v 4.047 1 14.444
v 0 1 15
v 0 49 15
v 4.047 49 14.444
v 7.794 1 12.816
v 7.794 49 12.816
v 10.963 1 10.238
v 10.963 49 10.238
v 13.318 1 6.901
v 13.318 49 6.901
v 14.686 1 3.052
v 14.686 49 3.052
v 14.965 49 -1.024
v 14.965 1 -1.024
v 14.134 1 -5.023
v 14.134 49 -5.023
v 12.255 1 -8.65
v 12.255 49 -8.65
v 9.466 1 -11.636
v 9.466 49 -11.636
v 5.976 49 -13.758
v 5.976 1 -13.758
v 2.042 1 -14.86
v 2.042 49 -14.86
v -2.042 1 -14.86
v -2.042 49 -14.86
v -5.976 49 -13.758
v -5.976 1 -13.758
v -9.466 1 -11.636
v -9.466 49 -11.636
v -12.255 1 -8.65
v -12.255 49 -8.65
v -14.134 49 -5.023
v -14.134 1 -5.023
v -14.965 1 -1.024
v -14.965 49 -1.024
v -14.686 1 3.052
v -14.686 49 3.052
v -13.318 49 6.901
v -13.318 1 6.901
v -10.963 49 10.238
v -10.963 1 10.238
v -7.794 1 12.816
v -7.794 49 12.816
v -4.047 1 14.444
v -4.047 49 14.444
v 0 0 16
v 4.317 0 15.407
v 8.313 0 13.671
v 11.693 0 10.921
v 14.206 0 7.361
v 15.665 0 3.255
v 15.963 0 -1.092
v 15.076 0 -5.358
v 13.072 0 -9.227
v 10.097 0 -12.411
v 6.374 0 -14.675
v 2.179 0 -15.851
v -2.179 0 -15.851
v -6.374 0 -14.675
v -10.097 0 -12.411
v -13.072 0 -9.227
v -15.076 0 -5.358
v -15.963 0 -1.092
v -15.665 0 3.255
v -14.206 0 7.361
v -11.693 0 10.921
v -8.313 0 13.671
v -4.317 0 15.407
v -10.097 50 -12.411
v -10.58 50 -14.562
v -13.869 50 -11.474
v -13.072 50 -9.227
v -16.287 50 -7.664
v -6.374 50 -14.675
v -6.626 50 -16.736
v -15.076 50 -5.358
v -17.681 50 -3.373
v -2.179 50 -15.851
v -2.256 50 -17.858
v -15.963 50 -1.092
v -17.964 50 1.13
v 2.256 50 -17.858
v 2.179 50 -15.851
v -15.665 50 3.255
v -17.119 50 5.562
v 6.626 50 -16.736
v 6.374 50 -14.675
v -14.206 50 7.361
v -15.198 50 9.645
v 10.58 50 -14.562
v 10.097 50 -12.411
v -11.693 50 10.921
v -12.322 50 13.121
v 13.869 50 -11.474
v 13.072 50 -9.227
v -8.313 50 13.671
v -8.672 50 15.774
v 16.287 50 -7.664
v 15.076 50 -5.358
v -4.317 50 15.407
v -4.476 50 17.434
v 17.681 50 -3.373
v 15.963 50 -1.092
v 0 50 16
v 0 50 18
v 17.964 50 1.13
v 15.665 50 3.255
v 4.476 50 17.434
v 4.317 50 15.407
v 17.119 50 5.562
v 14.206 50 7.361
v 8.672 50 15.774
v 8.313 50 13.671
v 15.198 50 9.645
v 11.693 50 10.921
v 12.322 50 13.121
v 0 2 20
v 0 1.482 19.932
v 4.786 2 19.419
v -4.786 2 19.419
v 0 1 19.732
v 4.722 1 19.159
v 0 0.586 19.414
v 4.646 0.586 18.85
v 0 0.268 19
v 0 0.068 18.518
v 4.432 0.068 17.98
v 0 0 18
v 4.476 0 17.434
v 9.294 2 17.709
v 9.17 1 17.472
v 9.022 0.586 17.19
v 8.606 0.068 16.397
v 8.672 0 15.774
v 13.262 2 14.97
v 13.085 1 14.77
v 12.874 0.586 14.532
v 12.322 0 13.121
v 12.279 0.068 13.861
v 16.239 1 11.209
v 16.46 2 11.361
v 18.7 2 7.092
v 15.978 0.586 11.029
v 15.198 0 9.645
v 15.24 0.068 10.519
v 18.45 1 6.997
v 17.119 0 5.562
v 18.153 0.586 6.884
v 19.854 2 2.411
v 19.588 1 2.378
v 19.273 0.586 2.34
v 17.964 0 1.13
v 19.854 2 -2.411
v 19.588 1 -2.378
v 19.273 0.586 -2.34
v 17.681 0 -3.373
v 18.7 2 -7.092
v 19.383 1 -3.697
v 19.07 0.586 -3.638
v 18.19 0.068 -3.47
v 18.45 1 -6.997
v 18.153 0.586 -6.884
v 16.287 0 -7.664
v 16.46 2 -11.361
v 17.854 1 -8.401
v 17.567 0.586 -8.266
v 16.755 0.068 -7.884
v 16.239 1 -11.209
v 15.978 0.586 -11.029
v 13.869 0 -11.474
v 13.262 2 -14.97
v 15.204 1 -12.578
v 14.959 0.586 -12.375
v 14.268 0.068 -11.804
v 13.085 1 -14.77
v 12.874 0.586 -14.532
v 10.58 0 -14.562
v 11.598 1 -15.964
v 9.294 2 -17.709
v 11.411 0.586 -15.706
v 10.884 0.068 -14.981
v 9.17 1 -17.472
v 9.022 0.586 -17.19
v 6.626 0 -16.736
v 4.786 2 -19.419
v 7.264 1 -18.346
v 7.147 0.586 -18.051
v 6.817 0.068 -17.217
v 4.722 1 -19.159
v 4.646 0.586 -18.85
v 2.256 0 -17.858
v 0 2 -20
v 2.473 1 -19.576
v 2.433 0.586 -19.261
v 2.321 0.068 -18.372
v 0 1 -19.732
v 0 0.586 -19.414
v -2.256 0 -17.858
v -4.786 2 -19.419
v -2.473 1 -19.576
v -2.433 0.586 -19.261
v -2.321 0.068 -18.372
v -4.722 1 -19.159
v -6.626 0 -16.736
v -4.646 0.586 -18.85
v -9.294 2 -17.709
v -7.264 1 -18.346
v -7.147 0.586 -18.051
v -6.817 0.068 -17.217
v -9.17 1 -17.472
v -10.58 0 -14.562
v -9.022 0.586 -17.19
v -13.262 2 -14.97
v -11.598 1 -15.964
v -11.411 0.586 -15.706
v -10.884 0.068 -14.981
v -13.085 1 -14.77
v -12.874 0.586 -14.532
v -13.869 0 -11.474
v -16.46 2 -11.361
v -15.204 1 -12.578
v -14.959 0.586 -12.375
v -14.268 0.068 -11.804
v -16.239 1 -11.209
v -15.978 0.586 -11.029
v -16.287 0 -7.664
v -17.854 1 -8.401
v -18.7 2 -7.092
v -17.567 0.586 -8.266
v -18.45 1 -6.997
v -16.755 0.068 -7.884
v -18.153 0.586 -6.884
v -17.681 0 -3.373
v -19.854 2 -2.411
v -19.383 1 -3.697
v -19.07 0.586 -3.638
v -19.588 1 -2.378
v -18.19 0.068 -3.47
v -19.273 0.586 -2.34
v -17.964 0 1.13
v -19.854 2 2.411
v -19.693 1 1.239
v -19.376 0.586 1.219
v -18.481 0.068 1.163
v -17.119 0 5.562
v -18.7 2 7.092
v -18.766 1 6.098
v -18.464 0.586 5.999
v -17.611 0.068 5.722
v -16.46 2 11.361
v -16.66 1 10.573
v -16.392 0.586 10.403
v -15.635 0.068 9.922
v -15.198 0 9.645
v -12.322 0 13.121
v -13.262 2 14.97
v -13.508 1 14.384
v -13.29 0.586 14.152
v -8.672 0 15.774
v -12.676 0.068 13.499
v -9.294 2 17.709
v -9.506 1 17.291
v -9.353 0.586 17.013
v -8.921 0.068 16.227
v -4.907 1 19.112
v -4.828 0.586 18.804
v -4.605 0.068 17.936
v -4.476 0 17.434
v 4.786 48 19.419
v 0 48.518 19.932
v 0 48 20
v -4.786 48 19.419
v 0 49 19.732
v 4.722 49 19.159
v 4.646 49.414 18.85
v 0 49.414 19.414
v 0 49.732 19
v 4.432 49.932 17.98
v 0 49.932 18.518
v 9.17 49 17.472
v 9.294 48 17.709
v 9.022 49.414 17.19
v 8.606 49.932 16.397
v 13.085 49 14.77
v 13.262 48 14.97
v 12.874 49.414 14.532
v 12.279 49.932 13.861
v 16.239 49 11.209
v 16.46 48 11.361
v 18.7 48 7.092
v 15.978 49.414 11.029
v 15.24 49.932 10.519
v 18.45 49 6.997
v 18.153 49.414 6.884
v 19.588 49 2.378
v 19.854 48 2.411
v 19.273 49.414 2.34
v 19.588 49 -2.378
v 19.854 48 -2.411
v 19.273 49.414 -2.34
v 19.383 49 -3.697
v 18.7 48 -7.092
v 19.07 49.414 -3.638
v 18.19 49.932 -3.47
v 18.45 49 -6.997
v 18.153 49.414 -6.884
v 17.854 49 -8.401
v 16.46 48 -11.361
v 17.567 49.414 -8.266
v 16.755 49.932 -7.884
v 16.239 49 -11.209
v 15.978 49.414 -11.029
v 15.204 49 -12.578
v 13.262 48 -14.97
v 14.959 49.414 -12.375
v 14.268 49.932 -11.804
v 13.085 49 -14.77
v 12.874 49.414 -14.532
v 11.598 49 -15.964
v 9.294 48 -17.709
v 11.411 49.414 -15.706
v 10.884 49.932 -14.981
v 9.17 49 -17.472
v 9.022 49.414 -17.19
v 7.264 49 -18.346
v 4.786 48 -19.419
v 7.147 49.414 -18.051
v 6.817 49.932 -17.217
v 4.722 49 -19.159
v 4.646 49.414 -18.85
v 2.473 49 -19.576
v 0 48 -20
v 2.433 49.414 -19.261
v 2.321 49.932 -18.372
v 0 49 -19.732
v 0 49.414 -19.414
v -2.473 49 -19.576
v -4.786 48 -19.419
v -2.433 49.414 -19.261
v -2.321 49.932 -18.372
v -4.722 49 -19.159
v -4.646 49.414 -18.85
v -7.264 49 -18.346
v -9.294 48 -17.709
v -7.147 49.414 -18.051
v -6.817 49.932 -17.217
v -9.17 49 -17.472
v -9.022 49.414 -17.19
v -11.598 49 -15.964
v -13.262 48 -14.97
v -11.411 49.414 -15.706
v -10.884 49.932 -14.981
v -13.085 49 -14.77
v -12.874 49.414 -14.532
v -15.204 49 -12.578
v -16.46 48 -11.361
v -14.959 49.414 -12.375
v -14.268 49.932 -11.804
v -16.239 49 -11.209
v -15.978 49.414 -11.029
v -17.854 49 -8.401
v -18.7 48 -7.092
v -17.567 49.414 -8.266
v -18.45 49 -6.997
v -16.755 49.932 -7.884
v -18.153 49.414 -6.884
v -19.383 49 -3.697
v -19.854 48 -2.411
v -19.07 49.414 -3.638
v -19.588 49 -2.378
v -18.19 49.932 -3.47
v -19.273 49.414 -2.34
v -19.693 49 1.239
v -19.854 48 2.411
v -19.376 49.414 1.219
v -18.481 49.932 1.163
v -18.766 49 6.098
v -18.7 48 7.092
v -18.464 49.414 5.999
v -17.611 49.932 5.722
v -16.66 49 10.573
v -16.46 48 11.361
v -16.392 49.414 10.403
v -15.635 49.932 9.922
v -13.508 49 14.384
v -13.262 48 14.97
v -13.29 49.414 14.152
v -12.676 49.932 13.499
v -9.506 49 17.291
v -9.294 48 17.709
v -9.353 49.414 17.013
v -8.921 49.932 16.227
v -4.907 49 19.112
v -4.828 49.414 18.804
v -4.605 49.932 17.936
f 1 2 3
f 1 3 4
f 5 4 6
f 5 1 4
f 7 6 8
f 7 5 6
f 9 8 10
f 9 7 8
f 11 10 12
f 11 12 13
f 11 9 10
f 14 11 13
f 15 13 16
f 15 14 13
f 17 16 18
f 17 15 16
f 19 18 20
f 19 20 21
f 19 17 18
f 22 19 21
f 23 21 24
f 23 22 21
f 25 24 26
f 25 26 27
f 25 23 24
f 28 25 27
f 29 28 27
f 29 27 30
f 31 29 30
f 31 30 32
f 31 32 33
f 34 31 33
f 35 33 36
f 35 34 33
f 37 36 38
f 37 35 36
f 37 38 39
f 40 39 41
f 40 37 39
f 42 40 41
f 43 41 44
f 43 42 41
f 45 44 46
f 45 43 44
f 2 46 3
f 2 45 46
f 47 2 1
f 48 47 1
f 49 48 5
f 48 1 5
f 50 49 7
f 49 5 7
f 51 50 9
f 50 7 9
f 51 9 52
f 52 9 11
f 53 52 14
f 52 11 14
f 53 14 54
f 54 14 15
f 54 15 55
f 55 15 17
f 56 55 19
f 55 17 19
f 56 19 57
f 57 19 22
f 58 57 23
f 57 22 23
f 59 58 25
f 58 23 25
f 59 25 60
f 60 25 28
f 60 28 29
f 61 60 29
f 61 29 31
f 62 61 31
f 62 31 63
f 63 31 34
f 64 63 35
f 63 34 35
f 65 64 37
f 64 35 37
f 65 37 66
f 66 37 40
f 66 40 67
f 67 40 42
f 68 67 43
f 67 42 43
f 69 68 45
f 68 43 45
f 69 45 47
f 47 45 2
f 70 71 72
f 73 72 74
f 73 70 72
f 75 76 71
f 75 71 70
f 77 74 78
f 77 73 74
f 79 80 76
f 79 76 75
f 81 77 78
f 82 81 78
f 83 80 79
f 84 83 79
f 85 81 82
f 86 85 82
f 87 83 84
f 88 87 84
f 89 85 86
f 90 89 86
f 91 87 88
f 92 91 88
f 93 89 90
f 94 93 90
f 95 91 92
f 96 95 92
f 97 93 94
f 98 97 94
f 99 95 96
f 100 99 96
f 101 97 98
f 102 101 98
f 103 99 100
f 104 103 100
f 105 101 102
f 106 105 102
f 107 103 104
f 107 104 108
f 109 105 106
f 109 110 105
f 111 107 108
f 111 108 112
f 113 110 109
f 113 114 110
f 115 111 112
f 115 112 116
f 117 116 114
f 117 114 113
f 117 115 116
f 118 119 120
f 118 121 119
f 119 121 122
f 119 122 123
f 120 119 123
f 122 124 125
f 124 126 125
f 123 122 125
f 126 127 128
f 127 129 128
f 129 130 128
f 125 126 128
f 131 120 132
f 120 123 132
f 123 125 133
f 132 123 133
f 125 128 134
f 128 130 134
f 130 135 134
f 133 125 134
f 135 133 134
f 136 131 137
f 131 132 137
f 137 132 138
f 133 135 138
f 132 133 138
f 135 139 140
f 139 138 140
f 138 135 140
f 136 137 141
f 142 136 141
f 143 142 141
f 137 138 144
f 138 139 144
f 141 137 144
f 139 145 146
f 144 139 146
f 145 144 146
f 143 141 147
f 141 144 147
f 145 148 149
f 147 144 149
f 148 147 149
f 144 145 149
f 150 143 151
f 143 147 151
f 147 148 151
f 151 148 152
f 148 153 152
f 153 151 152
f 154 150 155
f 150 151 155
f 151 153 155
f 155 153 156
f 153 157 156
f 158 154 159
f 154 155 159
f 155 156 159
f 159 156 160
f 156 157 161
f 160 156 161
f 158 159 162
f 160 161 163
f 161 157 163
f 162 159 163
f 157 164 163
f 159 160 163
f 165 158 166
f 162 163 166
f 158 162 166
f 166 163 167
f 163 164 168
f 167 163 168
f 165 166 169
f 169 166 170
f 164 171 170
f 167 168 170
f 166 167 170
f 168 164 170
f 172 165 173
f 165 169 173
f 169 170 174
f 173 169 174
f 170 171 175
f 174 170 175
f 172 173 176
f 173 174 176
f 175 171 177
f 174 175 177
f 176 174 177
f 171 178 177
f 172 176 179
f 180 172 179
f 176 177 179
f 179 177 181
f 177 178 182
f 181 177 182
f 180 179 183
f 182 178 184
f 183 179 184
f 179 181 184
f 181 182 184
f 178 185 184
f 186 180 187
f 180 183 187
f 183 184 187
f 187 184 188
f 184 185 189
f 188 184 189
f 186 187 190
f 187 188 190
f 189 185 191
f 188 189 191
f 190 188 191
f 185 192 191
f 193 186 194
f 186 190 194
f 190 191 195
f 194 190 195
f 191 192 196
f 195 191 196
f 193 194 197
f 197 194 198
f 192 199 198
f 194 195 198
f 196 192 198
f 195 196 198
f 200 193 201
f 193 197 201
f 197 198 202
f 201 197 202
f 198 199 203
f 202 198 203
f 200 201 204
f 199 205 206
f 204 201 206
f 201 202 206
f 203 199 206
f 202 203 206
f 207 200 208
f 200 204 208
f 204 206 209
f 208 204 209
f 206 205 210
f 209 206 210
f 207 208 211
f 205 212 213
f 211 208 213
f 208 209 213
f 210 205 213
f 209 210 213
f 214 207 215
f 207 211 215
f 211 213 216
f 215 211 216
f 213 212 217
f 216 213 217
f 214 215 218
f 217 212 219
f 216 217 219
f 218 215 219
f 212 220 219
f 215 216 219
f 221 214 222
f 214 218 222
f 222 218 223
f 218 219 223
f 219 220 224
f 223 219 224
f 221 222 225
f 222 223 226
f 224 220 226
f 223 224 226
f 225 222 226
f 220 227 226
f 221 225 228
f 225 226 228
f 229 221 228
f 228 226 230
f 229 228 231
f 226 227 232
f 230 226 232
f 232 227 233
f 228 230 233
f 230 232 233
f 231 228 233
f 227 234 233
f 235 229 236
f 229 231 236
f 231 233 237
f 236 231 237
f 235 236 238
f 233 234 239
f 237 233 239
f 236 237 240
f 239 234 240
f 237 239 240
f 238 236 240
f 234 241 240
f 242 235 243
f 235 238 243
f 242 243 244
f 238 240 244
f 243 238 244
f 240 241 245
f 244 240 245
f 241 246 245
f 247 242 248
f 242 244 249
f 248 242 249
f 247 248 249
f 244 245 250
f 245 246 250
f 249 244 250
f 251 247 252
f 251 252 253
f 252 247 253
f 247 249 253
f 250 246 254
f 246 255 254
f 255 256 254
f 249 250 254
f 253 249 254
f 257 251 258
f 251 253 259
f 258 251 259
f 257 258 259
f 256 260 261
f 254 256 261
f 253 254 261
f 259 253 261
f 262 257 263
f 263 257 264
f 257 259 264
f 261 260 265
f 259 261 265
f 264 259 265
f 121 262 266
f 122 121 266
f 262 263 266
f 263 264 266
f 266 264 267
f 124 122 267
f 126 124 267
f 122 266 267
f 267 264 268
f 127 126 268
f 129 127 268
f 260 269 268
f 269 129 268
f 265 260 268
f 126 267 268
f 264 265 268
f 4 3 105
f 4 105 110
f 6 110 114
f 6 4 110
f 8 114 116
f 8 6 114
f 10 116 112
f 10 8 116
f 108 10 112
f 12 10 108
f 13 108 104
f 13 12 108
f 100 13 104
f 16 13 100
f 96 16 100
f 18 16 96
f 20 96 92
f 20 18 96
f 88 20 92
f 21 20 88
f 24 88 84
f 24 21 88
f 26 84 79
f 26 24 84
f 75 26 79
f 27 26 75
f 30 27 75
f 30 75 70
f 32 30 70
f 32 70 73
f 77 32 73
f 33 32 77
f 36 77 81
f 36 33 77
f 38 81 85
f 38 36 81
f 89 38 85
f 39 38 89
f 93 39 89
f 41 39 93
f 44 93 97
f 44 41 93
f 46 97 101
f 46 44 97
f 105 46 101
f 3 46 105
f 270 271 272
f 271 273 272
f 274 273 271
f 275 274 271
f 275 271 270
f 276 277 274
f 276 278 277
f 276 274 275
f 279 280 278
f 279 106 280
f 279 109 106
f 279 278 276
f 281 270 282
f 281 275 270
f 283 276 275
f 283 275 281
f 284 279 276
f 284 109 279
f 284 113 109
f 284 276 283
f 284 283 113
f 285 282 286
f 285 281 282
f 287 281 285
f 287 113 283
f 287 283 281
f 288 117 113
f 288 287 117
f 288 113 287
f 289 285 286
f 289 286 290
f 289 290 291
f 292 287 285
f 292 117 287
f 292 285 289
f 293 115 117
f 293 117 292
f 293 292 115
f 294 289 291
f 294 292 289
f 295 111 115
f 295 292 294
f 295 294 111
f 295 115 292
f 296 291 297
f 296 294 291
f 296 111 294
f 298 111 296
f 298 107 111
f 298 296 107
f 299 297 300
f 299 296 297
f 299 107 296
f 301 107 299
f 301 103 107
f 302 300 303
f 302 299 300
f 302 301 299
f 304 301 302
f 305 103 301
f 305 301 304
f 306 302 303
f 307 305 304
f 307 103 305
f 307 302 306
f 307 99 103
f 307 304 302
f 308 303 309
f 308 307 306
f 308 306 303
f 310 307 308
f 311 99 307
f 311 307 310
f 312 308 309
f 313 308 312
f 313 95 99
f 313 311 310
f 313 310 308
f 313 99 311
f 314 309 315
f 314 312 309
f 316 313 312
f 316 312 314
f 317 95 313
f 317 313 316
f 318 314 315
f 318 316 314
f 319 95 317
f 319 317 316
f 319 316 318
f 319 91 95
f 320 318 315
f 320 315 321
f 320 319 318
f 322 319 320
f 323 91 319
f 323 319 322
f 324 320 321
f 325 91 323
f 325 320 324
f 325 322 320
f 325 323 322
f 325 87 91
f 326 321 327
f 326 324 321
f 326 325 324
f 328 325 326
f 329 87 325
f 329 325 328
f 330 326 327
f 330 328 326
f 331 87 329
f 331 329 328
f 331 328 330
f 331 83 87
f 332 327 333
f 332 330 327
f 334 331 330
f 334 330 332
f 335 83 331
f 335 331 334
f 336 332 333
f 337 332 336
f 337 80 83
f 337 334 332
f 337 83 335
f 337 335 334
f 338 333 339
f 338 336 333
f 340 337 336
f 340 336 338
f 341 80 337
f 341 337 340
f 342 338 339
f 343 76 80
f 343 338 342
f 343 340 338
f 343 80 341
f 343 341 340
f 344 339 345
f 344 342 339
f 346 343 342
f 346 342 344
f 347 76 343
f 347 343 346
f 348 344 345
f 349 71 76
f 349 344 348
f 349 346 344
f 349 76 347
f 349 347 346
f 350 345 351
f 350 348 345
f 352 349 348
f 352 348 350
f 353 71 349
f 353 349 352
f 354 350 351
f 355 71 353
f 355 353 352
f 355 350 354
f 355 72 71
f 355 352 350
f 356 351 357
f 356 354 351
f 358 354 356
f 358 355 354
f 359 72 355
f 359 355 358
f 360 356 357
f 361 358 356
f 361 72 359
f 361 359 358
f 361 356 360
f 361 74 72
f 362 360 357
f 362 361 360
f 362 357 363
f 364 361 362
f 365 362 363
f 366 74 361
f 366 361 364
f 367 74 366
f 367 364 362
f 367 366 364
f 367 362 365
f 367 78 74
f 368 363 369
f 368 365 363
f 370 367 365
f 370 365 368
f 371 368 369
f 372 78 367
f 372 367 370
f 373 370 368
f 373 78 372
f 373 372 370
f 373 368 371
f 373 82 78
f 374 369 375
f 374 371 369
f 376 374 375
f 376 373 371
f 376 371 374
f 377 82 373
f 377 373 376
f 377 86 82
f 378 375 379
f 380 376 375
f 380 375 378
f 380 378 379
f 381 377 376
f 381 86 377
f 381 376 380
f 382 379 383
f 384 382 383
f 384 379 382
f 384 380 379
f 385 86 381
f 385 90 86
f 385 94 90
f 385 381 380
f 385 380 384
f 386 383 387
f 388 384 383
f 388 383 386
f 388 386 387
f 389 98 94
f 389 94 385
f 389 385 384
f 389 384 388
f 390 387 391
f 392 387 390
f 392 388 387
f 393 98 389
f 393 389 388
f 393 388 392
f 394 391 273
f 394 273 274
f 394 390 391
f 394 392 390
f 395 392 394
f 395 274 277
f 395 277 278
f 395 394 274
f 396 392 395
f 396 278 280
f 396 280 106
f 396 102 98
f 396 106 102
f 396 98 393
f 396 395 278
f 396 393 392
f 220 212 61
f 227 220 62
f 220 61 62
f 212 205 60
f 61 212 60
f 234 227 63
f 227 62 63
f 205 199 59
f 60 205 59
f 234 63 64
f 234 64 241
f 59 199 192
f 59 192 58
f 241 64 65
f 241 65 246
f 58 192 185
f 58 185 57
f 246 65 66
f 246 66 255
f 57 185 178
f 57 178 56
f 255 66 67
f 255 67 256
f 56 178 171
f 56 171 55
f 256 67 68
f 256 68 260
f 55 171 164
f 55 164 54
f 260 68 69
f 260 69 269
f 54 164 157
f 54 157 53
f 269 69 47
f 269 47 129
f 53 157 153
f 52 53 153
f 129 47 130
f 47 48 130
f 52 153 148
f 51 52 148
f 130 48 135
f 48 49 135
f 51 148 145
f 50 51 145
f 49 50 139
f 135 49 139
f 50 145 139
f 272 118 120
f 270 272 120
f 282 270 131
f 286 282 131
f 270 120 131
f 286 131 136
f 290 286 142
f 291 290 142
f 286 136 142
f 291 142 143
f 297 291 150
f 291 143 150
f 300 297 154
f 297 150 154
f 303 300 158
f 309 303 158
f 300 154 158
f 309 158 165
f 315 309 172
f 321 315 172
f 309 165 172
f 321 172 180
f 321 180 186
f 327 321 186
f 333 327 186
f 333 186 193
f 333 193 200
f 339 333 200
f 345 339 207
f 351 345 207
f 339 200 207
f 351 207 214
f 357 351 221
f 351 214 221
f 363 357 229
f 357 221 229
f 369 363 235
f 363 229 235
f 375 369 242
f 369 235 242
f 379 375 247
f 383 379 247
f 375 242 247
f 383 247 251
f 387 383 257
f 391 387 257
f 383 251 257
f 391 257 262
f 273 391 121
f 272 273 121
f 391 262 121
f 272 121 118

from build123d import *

# Parameters (mm, degrees)
ESBO_O1_R                = 20
ESBO_O1_R_2              = 15
RESSALTO_EXTRUS_O1_DEPTH = 50
FILETE1_R                = 2
CHANFRO1_SIZE            = 1


with BuildPart() as part:
    # Esboço1 → Ressalto-extrusão1 (new body)
    with BuildSketch(Plane(origin=(0, 0, 0), x_dir=(1, 0, 0), z_dir=(0, 1, 0))):
        with Locations(Location((0, 0, 0), (0, 0, 270))):  # turned: the seam where the file's is
            Circle(ESBO_O1_R)
        with Locations(Location((0, 0, 0), (0, 0, 270))):  # turned: the seam where the file's is
            Circle(ESBO_O1_R_2, mode=Mode.SUBTRACT)
    extrude(amount=RESSALTO_EXTRUS_O1_DEPTH)

    # Filete1
    filete1_edges = [part.edges().sort_by_distance(p)[0] for p in [
        (0, 0, -20),
        (0, 50, -20),
    ]]
    fillet(filete1_edges, radius=FILETE1_R)

    # Chanfro1
    chanfro1_edges = [part.edges().sort_by_distance(p)[0] for p in [
        (0, 0, -15),
        (0, 50, -15),
    ]]
    chamfer(chanfro1_edges, length=CHANFRO1_SIZE)


solid = part.part
